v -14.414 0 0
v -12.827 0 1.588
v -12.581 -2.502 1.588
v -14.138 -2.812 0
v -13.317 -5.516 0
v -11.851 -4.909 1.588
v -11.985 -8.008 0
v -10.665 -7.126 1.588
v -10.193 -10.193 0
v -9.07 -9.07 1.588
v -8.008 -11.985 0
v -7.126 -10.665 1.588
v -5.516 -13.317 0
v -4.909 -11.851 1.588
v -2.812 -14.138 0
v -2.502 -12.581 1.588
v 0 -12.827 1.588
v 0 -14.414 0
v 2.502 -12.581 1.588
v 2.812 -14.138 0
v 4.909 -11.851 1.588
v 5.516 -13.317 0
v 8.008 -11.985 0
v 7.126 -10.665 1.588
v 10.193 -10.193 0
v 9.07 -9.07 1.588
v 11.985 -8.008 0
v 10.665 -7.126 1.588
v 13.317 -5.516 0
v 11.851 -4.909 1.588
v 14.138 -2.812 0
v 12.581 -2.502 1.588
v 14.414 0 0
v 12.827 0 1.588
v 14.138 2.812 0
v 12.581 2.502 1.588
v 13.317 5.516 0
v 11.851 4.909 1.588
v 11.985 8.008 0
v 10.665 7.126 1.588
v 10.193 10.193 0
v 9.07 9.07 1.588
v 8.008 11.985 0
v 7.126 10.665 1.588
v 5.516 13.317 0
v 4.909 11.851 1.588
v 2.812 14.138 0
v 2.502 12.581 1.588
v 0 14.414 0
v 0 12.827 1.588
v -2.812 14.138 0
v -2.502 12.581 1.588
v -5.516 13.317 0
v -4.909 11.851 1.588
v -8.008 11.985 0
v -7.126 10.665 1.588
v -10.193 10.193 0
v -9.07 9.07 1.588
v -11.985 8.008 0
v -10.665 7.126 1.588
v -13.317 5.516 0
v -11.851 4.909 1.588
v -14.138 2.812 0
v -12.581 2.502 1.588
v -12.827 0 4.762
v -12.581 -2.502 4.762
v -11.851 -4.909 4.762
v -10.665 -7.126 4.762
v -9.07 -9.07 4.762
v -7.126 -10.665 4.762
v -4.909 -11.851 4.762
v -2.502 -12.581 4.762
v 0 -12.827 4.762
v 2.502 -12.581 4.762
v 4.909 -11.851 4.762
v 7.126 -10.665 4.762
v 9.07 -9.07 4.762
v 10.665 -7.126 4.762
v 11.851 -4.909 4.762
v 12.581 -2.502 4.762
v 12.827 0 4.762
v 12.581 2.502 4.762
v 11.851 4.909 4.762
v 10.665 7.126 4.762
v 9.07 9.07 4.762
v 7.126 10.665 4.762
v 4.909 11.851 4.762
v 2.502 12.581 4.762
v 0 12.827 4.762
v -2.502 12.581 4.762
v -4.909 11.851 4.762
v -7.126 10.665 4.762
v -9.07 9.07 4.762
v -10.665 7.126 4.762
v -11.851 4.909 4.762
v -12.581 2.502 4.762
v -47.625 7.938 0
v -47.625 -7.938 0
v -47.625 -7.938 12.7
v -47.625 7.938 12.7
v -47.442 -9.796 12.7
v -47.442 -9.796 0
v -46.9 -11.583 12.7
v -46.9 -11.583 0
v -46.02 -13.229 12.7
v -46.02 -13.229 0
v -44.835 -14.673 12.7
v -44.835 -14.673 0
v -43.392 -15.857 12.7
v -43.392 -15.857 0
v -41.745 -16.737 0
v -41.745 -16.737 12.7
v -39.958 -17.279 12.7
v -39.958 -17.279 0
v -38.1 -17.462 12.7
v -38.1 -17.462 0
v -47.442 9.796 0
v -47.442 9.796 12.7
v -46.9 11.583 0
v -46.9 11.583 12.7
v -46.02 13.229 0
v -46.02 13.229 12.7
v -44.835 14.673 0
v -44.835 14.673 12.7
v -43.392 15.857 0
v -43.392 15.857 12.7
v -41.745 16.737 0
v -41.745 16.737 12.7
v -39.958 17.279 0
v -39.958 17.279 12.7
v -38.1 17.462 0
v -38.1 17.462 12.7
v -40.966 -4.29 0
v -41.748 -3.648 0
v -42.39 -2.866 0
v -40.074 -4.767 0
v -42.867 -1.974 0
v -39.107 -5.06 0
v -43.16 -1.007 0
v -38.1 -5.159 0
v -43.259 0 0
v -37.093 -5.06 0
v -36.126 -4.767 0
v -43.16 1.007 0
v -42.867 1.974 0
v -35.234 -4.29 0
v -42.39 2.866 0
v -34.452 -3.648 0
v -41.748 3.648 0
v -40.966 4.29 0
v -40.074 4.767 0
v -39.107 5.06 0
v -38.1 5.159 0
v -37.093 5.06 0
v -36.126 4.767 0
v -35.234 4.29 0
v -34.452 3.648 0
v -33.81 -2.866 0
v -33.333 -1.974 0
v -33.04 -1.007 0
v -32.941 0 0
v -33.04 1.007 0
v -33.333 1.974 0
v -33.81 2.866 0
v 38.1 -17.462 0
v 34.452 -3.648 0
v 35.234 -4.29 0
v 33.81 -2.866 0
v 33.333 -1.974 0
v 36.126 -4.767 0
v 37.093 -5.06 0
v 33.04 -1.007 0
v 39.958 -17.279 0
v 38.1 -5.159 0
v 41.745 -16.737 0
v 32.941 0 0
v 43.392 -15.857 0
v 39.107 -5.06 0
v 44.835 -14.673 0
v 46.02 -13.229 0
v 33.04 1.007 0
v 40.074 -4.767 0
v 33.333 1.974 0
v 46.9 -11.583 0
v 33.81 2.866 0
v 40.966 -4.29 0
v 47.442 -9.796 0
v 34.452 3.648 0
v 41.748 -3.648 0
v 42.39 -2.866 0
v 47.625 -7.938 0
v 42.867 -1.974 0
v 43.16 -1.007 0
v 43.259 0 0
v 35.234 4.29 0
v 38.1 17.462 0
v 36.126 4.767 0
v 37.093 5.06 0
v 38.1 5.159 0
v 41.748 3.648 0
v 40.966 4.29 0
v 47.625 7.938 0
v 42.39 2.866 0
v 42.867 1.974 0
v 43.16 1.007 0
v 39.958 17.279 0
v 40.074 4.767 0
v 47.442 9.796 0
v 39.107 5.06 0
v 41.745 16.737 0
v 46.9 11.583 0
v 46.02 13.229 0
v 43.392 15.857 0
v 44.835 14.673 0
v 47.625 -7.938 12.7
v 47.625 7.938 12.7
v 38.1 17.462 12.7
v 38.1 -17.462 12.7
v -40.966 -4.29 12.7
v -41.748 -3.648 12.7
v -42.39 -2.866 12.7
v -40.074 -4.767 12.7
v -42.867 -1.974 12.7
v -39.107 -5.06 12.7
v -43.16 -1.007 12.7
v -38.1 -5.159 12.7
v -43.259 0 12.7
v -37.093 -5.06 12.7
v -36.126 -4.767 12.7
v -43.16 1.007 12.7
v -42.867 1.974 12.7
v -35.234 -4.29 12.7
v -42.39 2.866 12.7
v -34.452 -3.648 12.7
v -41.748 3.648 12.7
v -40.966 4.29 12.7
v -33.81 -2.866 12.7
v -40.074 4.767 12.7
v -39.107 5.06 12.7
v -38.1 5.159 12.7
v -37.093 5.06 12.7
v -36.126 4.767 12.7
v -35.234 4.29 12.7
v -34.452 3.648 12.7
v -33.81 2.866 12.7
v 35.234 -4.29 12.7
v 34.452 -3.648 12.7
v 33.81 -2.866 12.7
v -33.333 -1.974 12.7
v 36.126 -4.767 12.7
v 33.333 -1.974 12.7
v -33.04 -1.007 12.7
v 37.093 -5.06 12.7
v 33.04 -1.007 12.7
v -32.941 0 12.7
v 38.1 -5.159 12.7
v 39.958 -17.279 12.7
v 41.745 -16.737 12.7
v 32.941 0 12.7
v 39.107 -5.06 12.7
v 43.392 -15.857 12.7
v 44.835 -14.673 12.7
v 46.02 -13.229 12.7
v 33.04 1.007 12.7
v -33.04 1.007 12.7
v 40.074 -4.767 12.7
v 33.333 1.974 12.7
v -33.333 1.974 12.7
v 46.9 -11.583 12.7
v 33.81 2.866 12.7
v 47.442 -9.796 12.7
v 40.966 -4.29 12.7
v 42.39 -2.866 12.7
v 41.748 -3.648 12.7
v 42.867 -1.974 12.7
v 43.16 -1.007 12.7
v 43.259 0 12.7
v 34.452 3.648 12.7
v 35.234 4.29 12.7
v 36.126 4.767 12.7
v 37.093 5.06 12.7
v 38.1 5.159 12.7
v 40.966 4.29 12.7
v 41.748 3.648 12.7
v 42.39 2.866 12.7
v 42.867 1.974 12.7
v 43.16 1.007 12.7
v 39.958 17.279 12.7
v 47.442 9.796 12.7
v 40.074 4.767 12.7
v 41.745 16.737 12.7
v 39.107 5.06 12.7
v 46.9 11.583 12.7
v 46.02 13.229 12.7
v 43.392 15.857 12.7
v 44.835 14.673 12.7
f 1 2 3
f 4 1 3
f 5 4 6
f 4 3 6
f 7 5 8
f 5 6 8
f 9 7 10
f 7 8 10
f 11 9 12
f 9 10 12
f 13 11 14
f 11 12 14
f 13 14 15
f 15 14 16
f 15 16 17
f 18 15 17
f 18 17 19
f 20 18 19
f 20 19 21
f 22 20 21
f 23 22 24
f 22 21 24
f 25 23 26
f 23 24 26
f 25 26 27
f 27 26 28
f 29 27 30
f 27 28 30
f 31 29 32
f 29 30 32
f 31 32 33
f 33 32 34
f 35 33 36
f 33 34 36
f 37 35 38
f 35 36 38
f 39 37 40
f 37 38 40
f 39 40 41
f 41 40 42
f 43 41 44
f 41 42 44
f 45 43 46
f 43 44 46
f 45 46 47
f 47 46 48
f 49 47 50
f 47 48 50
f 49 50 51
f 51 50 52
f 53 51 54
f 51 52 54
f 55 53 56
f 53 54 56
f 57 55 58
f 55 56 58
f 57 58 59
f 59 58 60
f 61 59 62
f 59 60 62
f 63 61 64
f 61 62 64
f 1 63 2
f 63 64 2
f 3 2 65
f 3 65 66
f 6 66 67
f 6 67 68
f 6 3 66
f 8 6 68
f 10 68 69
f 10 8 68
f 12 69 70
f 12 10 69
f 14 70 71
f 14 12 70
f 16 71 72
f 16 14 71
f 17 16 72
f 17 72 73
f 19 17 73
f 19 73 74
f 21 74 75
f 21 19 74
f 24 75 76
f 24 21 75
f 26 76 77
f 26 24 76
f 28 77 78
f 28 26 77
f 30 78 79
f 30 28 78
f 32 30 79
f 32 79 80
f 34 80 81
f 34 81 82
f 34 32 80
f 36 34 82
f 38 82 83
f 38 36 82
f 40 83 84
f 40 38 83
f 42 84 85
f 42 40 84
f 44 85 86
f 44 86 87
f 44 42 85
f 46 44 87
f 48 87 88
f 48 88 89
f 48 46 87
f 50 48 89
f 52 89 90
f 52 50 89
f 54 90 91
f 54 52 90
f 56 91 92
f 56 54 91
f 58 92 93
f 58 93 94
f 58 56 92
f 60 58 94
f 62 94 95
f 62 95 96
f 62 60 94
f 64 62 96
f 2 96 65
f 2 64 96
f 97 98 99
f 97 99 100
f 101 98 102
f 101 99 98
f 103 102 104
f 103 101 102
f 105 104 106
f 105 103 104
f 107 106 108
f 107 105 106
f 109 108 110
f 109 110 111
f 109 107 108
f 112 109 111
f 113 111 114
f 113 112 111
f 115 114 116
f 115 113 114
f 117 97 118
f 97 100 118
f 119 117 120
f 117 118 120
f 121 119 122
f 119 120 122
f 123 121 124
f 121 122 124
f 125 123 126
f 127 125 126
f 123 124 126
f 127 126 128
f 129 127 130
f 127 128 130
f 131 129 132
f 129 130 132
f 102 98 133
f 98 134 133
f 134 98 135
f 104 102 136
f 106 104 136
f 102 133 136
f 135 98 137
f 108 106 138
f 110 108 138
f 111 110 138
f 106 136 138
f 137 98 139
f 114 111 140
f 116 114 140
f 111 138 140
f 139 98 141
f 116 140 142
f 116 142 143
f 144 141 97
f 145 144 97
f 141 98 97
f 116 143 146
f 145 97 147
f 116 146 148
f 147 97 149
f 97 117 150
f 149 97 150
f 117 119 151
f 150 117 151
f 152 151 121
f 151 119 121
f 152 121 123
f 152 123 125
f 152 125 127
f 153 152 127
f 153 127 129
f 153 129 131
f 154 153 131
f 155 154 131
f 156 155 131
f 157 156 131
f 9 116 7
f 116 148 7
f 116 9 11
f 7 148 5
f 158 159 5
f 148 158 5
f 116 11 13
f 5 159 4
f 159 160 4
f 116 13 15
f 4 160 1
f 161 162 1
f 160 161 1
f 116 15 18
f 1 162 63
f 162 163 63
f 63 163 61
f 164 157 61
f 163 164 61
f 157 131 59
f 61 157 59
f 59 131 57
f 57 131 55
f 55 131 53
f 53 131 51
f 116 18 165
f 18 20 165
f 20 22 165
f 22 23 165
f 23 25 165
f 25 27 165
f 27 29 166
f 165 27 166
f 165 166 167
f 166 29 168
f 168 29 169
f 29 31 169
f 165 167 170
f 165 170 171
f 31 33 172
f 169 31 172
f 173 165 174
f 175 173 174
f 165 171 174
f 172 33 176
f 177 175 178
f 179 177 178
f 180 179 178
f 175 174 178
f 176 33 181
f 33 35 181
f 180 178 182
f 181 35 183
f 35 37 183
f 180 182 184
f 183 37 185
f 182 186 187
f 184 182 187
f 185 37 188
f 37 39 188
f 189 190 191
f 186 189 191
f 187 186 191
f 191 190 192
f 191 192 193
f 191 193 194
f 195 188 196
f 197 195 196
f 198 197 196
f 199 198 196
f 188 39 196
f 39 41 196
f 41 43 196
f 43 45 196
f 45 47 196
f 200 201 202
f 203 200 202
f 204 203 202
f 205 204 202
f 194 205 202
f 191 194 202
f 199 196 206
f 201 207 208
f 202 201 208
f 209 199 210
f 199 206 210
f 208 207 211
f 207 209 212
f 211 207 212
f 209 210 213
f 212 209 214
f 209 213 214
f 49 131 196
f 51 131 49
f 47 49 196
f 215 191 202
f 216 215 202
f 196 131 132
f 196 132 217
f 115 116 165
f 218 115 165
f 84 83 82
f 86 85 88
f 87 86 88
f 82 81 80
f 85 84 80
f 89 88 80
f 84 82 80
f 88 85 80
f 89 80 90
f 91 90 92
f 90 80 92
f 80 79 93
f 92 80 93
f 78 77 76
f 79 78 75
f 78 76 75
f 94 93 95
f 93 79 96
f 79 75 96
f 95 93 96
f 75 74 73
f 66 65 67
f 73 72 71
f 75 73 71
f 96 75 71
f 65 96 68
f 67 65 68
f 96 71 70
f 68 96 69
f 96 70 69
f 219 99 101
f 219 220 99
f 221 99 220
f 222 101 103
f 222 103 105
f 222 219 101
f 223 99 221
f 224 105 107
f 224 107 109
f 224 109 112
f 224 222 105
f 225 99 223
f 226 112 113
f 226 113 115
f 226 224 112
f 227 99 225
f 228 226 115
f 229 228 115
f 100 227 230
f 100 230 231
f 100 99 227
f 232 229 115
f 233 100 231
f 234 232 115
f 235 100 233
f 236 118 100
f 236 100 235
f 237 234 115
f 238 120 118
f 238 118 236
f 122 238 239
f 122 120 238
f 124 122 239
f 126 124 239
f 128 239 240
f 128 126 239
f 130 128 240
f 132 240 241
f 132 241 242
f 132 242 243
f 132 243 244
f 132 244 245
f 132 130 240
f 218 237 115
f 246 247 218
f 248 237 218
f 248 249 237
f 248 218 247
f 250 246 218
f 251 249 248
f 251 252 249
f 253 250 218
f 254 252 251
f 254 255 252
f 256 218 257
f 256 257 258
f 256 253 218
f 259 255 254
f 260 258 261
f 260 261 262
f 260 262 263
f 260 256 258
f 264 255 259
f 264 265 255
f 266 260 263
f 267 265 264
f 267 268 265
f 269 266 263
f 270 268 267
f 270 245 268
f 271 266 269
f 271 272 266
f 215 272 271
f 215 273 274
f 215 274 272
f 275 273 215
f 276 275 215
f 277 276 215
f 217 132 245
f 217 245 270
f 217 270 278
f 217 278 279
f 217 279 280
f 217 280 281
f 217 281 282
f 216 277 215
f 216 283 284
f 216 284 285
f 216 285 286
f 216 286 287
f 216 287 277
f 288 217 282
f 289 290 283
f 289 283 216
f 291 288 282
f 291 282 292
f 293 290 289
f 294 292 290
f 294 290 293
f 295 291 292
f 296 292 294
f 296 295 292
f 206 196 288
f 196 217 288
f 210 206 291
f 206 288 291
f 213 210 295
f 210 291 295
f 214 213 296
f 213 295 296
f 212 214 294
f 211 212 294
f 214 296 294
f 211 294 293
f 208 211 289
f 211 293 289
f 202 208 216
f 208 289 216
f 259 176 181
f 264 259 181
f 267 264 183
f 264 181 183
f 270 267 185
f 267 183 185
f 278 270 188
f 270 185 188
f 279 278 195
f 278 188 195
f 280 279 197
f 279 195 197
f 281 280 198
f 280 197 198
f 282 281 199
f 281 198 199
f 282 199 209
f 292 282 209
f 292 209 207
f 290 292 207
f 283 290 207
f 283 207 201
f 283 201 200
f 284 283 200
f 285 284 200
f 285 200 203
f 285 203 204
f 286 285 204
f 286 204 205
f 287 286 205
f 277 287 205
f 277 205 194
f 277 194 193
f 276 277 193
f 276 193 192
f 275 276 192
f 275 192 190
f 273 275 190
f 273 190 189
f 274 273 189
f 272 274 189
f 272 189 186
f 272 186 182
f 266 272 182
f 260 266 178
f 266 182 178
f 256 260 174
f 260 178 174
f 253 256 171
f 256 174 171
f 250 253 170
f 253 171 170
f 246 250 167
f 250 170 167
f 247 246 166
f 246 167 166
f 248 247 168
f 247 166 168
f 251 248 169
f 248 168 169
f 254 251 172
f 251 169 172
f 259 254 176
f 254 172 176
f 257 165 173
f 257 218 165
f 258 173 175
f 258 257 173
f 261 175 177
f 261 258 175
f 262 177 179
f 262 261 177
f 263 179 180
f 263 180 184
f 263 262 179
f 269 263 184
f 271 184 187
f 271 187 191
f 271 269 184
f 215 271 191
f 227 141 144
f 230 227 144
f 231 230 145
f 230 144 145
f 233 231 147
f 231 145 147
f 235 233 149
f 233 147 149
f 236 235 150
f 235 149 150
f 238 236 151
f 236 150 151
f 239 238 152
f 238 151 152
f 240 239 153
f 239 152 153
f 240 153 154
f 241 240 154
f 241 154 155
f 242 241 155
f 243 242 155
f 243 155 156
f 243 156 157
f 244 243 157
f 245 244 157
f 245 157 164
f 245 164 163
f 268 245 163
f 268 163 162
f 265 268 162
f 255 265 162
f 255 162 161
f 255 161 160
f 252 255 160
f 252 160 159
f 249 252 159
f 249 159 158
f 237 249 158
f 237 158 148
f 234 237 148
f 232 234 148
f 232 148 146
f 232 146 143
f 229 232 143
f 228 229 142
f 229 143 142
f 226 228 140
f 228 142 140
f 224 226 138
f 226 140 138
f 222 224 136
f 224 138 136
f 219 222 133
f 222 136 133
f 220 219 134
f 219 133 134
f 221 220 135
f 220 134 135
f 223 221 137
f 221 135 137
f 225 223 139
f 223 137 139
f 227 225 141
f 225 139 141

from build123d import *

# Parameters (mm, degrees)
SKETCH1_W                        = 95.25
SKETCH1_H                        = 34.925
BASE_FLANGE1_DEPTH               = 12.7
SKETCH2_R                        = 12.827
CUT_EXTRUDE1_DEPTH               = 4.7625
F_13_32_0_40625_DIAMETER_HOLE1_D = 10.31875
CHAMFER1_SIZE                    = 1.5875
FILLET1_R                        = 9.525


# Sheet-metal steps are written as plain solids
with BuildPart() as part:
    # Sketch1 → Base-Flange1 (new body)
    with BuildSketch(Plane.XY):
        Rectangle(SKETCH1_W, SKETCH1_H)
    extrude(amount=BASE_FLANGE1_DEPTH)

    # Sketch2 → Cut-Extrude1 (cut)
    with BuildSketch(Plane.XY):
        with Locations(Location((0, 0, 0), (0, 0, 180))):
            Circle(SKETCH2_R)
    extrude(amount=CUT_EXTRUDE1_DEPTH, mode=Mode.SUBTRACT)

    # 13/32 (0.40625) Diameter Hole1 (through all)
    with Locations(Plane.XY.offset(12.7)):
        with Locations((38.1, 0), (-38.1, 0)):
            Hole(F_13_32_0_40625_DIAMETER_HOLE1_D / 2)

    # Chamfer1
    chamfer1_edges = [part.edges().sort_by_distance(p)[0] for p in [
        (12.827, 0, 0),
    ]]
    chamfer(chamfer1_edges, length=CHAMFER1_SIZE)

    # Fillet1
    fillet1_edges = [part.edges().sort_by_distance(p)[0] for p in [
        (-47.625, 17.4625, 6.35),
        (47.625, 17.4625, 6.35),
        (47.625, -17.4625, 6.35),
        (-47.625, -17.4625, 6.35),
    ]]
    fillet(fillet1_edges, radius=FILLET1_R)


solid = part.part
